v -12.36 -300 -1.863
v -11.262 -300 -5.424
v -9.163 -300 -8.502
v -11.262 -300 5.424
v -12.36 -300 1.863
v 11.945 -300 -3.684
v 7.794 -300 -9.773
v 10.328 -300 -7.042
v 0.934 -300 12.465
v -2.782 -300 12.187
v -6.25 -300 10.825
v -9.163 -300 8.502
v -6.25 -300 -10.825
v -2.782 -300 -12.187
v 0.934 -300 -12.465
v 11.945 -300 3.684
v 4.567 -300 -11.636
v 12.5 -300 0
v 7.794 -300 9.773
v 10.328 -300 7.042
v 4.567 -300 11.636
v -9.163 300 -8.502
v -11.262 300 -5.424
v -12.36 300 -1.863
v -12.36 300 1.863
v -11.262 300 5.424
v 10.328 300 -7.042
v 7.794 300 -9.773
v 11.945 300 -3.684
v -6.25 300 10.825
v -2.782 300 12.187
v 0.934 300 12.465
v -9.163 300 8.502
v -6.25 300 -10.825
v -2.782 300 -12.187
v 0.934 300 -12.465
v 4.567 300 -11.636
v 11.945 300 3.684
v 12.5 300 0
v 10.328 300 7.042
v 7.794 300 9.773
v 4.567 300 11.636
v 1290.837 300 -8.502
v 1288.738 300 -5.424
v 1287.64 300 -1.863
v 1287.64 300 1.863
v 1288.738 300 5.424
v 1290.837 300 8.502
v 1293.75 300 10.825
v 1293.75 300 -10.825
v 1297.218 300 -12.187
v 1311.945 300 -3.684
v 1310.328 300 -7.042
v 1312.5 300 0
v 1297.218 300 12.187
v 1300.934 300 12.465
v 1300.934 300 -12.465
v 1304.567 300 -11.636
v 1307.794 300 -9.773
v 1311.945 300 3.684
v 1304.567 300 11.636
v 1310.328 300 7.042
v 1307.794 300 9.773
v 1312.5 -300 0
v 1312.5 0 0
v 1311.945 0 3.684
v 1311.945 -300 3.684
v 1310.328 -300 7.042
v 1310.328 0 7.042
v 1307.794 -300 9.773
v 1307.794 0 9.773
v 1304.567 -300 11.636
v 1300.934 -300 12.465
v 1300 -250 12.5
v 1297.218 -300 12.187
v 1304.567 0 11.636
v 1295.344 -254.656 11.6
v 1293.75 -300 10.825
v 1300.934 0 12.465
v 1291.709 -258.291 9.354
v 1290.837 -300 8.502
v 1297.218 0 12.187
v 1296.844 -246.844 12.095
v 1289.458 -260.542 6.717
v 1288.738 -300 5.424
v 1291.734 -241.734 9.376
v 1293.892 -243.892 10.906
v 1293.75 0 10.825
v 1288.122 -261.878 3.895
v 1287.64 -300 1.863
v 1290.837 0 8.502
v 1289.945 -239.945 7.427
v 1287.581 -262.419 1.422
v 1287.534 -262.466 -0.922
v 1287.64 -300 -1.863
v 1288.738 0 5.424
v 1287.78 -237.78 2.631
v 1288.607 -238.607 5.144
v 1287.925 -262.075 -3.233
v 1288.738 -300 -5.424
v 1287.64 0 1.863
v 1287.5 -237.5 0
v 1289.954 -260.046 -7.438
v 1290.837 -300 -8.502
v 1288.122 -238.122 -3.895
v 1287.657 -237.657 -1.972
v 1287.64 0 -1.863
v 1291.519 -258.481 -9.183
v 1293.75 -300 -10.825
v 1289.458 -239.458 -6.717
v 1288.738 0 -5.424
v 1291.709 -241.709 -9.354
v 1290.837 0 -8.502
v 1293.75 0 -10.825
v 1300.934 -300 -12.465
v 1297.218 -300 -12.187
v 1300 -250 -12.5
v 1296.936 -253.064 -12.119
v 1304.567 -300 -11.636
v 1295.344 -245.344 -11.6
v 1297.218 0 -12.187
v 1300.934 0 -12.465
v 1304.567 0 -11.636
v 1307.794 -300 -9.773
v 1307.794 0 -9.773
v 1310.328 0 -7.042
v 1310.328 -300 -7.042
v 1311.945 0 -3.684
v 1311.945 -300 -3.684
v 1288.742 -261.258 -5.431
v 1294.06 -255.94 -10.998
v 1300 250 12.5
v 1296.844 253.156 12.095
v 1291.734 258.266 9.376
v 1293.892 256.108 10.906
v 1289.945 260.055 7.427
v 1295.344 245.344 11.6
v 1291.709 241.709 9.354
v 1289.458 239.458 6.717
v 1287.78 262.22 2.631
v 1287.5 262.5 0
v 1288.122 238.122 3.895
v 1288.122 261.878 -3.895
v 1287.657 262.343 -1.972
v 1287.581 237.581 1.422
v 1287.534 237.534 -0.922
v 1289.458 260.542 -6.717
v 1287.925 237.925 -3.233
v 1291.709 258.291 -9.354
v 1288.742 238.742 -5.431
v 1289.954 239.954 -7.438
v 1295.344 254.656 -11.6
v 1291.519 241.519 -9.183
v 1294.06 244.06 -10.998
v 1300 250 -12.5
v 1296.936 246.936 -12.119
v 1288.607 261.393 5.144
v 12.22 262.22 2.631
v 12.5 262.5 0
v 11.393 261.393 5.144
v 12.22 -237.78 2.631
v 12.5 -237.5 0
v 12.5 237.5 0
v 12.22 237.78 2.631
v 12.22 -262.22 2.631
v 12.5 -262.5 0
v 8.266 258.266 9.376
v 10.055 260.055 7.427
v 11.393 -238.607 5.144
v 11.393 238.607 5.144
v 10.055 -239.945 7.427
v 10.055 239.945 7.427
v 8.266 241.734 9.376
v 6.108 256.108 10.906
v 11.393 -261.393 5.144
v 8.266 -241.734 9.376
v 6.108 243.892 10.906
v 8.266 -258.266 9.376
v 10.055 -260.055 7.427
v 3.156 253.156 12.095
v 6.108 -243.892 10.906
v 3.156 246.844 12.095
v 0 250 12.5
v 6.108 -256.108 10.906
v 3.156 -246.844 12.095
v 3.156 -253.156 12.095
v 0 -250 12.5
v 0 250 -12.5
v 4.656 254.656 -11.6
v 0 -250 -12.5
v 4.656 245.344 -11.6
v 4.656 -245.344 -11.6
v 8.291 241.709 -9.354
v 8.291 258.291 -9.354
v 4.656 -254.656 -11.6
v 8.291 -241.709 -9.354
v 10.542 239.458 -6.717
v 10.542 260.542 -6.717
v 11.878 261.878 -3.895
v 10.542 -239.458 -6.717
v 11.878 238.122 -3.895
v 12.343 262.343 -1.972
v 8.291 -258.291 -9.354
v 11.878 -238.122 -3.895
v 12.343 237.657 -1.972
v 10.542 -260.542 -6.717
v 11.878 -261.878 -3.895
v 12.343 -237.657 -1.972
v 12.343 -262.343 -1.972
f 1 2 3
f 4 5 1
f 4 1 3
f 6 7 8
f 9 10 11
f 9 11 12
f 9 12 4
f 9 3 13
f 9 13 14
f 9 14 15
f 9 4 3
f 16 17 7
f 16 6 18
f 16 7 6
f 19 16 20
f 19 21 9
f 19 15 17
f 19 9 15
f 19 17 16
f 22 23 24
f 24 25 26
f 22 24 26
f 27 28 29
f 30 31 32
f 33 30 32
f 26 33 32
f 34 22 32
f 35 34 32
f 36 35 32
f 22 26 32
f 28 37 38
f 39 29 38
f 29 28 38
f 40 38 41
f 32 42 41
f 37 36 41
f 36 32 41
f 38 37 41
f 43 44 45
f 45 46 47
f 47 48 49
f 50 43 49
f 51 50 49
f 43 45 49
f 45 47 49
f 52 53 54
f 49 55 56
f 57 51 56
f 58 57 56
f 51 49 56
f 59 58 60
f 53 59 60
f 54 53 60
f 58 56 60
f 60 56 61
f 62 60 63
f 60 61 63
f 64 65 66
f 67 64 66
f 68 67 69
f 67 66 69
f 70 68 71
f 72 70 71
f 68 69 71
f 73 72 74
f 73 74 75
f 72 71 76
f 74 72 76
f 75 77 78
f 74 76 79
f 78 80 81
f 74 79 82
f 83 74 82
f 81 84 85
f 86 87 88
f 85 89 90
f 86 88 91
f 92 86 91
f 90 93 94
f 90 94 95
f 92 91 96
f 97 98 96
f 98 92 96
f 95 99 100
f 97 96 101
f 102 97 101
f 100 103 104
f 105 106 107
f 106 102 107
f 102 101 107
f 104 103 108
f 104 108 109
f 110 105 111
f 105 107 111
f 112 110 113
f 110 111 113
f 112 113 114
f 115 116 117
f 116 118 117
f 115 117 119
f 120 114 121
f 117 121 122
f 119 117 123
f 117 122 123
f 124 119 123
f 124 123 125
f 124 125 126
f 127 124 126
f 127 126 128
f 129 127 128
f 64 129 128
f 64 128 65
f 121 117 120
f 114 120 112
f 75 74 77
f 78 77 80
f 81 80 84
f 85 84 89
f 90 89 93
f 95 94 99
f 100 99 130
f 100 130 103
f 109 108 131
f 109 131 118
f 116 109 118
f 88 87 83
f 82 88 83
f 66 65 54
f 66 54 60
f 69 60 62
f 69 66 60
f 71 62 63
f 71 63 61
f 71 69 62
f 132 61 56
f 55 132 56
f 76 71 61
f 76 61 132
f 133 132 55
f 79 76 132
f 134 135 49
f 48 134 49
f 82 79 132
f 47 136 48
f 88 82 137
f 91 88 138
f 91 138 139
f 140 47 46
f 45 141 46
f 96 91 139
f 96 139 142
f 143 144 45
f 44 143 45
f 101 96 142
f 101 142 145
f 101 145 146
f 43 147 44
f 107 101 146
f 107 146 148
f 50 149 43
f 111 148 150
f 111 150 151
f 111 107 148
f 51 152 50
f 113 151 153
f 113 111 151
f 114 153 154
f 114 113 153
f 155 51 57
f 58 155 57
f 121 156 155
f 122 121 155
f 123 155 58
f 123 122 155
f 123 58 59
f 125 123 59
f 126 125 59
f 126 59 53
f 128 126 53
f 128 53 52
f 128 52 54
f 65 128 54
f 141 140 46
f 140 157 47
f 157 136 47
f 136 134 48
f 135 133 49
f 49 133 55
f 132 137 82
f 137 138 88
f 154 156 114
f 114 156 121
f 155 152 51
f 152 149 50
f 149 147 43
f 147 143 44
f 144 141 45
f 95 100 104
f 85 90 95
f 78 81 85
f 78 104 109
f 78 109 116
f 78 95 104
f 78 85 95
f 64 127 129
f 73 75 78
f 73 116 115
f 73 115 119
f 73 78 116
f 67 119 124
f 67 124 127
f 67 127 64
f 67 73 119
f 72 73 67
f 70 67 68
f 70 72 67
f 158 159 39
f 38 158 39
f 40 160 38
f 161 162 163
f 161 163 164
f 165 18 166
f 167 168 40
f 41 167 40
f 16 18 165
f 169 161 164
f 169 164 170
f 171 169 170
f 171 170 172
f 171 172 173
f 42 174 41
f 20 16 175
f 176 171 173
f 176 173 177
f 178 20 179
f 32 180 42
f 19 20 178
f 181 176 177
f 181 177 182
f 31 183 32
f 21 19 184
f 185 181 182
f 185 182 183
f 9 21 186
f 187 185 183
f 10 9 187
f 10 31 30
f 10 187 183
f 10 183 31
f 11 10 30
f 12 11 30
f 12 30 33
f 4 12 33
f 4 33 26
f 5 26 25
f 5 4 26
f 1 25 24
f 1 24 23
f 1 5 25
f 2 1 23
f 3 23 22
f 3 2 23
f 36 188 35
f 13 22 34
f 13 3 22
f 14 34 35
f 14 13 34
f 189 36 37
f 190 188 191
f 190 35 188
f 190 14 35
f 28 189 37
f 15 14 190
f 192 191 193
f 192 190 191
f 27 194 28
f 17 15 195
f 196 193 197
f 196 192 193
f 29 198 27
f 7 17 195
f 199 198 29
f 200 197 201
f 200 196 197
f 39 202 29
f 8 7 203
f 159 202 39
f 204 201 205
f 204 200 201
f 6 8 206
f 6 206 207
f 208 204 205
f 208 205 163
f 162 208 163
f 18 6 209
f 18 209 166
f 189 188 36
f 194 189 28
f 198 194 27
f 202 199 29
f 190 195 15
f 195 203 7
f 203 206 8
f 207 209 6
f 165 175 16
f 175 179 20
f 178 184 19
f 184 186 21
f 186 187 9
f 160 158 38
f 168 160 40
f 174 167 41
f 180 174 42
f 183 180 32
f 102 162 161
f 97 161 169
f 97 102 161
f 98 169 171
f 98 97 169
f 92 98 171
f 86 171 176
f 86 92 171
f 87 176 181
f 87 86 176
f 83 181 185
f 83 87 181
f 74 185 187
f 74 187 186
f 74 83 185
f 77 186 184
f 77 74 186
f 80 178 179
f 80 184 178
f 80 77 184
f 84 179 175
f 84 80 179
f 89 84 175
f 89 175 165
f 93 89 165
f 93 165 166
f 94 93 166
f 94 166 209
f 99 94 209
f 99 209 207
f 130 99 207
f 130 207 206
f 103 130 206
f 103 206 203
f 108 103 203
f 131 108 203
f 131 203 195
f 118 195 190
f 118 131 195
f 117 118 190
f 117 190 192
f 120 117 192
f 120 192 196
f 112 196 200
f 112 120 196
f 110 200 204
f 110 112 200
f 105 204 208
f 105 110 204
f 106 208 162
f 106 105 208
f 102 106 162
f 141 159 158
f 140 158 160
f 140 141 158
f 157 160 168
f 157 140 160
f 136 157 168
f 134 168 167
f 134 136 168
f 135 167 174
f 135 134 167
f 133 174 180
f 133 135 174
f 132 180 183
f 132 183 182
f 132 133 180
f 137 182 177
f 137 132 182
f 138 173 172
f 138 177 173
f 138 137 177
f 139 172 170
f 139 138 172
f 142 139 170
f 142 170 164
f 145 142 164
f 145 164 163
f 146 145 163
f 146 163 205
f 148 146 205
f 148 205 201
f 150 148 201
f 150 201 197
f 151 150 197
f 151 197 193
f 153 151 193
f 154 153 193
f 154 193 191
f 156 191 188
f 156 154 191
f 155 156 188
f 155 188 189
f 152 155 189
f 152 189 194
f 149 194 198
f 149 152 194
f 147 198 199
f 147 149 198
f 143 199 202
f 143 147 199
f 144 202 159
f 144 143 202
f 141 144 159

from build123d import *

# Parameters (mm, degrees)
F0_R          = 12.5
F1_DEPTH      = 300
F3_R          = 12.5
F5_R          = 12.5
F6_DEPTH      = 300
F6_DEPTH_BACK = 300


with BuildPart() as f1:
    # F0 (on Front) → F1 (new body, symmetric)
    with BuildSketch(Plane.XZ):
        Circle(F0_R)
    extrude(amount=F1_DEPTH, both=True)

    # F3 (on offset) → F4 (join, up to the next surface of F1)
    with BuildSketch(Plane.YZ.offset(1300)):
        with Locations((-250, 0)):
            Circle(F3_R)
        with Locations((250, 0)):
            Circle(F3_R)
    extrude(until=Until.NEXT, dir=(-1, 0, 0))

    # F5 (on Front) → F6 (join, two sides)
    with BuildSketch(Plane.XZ) as f6_sk:
        with Locations((1300, 0)):
            Circle(F5_R)
    extrude(amount=F6_DEPTH)
    extrude(f6_sk.sketch, amount=-F6_DEPTH_BACK)


solid = f1.part
